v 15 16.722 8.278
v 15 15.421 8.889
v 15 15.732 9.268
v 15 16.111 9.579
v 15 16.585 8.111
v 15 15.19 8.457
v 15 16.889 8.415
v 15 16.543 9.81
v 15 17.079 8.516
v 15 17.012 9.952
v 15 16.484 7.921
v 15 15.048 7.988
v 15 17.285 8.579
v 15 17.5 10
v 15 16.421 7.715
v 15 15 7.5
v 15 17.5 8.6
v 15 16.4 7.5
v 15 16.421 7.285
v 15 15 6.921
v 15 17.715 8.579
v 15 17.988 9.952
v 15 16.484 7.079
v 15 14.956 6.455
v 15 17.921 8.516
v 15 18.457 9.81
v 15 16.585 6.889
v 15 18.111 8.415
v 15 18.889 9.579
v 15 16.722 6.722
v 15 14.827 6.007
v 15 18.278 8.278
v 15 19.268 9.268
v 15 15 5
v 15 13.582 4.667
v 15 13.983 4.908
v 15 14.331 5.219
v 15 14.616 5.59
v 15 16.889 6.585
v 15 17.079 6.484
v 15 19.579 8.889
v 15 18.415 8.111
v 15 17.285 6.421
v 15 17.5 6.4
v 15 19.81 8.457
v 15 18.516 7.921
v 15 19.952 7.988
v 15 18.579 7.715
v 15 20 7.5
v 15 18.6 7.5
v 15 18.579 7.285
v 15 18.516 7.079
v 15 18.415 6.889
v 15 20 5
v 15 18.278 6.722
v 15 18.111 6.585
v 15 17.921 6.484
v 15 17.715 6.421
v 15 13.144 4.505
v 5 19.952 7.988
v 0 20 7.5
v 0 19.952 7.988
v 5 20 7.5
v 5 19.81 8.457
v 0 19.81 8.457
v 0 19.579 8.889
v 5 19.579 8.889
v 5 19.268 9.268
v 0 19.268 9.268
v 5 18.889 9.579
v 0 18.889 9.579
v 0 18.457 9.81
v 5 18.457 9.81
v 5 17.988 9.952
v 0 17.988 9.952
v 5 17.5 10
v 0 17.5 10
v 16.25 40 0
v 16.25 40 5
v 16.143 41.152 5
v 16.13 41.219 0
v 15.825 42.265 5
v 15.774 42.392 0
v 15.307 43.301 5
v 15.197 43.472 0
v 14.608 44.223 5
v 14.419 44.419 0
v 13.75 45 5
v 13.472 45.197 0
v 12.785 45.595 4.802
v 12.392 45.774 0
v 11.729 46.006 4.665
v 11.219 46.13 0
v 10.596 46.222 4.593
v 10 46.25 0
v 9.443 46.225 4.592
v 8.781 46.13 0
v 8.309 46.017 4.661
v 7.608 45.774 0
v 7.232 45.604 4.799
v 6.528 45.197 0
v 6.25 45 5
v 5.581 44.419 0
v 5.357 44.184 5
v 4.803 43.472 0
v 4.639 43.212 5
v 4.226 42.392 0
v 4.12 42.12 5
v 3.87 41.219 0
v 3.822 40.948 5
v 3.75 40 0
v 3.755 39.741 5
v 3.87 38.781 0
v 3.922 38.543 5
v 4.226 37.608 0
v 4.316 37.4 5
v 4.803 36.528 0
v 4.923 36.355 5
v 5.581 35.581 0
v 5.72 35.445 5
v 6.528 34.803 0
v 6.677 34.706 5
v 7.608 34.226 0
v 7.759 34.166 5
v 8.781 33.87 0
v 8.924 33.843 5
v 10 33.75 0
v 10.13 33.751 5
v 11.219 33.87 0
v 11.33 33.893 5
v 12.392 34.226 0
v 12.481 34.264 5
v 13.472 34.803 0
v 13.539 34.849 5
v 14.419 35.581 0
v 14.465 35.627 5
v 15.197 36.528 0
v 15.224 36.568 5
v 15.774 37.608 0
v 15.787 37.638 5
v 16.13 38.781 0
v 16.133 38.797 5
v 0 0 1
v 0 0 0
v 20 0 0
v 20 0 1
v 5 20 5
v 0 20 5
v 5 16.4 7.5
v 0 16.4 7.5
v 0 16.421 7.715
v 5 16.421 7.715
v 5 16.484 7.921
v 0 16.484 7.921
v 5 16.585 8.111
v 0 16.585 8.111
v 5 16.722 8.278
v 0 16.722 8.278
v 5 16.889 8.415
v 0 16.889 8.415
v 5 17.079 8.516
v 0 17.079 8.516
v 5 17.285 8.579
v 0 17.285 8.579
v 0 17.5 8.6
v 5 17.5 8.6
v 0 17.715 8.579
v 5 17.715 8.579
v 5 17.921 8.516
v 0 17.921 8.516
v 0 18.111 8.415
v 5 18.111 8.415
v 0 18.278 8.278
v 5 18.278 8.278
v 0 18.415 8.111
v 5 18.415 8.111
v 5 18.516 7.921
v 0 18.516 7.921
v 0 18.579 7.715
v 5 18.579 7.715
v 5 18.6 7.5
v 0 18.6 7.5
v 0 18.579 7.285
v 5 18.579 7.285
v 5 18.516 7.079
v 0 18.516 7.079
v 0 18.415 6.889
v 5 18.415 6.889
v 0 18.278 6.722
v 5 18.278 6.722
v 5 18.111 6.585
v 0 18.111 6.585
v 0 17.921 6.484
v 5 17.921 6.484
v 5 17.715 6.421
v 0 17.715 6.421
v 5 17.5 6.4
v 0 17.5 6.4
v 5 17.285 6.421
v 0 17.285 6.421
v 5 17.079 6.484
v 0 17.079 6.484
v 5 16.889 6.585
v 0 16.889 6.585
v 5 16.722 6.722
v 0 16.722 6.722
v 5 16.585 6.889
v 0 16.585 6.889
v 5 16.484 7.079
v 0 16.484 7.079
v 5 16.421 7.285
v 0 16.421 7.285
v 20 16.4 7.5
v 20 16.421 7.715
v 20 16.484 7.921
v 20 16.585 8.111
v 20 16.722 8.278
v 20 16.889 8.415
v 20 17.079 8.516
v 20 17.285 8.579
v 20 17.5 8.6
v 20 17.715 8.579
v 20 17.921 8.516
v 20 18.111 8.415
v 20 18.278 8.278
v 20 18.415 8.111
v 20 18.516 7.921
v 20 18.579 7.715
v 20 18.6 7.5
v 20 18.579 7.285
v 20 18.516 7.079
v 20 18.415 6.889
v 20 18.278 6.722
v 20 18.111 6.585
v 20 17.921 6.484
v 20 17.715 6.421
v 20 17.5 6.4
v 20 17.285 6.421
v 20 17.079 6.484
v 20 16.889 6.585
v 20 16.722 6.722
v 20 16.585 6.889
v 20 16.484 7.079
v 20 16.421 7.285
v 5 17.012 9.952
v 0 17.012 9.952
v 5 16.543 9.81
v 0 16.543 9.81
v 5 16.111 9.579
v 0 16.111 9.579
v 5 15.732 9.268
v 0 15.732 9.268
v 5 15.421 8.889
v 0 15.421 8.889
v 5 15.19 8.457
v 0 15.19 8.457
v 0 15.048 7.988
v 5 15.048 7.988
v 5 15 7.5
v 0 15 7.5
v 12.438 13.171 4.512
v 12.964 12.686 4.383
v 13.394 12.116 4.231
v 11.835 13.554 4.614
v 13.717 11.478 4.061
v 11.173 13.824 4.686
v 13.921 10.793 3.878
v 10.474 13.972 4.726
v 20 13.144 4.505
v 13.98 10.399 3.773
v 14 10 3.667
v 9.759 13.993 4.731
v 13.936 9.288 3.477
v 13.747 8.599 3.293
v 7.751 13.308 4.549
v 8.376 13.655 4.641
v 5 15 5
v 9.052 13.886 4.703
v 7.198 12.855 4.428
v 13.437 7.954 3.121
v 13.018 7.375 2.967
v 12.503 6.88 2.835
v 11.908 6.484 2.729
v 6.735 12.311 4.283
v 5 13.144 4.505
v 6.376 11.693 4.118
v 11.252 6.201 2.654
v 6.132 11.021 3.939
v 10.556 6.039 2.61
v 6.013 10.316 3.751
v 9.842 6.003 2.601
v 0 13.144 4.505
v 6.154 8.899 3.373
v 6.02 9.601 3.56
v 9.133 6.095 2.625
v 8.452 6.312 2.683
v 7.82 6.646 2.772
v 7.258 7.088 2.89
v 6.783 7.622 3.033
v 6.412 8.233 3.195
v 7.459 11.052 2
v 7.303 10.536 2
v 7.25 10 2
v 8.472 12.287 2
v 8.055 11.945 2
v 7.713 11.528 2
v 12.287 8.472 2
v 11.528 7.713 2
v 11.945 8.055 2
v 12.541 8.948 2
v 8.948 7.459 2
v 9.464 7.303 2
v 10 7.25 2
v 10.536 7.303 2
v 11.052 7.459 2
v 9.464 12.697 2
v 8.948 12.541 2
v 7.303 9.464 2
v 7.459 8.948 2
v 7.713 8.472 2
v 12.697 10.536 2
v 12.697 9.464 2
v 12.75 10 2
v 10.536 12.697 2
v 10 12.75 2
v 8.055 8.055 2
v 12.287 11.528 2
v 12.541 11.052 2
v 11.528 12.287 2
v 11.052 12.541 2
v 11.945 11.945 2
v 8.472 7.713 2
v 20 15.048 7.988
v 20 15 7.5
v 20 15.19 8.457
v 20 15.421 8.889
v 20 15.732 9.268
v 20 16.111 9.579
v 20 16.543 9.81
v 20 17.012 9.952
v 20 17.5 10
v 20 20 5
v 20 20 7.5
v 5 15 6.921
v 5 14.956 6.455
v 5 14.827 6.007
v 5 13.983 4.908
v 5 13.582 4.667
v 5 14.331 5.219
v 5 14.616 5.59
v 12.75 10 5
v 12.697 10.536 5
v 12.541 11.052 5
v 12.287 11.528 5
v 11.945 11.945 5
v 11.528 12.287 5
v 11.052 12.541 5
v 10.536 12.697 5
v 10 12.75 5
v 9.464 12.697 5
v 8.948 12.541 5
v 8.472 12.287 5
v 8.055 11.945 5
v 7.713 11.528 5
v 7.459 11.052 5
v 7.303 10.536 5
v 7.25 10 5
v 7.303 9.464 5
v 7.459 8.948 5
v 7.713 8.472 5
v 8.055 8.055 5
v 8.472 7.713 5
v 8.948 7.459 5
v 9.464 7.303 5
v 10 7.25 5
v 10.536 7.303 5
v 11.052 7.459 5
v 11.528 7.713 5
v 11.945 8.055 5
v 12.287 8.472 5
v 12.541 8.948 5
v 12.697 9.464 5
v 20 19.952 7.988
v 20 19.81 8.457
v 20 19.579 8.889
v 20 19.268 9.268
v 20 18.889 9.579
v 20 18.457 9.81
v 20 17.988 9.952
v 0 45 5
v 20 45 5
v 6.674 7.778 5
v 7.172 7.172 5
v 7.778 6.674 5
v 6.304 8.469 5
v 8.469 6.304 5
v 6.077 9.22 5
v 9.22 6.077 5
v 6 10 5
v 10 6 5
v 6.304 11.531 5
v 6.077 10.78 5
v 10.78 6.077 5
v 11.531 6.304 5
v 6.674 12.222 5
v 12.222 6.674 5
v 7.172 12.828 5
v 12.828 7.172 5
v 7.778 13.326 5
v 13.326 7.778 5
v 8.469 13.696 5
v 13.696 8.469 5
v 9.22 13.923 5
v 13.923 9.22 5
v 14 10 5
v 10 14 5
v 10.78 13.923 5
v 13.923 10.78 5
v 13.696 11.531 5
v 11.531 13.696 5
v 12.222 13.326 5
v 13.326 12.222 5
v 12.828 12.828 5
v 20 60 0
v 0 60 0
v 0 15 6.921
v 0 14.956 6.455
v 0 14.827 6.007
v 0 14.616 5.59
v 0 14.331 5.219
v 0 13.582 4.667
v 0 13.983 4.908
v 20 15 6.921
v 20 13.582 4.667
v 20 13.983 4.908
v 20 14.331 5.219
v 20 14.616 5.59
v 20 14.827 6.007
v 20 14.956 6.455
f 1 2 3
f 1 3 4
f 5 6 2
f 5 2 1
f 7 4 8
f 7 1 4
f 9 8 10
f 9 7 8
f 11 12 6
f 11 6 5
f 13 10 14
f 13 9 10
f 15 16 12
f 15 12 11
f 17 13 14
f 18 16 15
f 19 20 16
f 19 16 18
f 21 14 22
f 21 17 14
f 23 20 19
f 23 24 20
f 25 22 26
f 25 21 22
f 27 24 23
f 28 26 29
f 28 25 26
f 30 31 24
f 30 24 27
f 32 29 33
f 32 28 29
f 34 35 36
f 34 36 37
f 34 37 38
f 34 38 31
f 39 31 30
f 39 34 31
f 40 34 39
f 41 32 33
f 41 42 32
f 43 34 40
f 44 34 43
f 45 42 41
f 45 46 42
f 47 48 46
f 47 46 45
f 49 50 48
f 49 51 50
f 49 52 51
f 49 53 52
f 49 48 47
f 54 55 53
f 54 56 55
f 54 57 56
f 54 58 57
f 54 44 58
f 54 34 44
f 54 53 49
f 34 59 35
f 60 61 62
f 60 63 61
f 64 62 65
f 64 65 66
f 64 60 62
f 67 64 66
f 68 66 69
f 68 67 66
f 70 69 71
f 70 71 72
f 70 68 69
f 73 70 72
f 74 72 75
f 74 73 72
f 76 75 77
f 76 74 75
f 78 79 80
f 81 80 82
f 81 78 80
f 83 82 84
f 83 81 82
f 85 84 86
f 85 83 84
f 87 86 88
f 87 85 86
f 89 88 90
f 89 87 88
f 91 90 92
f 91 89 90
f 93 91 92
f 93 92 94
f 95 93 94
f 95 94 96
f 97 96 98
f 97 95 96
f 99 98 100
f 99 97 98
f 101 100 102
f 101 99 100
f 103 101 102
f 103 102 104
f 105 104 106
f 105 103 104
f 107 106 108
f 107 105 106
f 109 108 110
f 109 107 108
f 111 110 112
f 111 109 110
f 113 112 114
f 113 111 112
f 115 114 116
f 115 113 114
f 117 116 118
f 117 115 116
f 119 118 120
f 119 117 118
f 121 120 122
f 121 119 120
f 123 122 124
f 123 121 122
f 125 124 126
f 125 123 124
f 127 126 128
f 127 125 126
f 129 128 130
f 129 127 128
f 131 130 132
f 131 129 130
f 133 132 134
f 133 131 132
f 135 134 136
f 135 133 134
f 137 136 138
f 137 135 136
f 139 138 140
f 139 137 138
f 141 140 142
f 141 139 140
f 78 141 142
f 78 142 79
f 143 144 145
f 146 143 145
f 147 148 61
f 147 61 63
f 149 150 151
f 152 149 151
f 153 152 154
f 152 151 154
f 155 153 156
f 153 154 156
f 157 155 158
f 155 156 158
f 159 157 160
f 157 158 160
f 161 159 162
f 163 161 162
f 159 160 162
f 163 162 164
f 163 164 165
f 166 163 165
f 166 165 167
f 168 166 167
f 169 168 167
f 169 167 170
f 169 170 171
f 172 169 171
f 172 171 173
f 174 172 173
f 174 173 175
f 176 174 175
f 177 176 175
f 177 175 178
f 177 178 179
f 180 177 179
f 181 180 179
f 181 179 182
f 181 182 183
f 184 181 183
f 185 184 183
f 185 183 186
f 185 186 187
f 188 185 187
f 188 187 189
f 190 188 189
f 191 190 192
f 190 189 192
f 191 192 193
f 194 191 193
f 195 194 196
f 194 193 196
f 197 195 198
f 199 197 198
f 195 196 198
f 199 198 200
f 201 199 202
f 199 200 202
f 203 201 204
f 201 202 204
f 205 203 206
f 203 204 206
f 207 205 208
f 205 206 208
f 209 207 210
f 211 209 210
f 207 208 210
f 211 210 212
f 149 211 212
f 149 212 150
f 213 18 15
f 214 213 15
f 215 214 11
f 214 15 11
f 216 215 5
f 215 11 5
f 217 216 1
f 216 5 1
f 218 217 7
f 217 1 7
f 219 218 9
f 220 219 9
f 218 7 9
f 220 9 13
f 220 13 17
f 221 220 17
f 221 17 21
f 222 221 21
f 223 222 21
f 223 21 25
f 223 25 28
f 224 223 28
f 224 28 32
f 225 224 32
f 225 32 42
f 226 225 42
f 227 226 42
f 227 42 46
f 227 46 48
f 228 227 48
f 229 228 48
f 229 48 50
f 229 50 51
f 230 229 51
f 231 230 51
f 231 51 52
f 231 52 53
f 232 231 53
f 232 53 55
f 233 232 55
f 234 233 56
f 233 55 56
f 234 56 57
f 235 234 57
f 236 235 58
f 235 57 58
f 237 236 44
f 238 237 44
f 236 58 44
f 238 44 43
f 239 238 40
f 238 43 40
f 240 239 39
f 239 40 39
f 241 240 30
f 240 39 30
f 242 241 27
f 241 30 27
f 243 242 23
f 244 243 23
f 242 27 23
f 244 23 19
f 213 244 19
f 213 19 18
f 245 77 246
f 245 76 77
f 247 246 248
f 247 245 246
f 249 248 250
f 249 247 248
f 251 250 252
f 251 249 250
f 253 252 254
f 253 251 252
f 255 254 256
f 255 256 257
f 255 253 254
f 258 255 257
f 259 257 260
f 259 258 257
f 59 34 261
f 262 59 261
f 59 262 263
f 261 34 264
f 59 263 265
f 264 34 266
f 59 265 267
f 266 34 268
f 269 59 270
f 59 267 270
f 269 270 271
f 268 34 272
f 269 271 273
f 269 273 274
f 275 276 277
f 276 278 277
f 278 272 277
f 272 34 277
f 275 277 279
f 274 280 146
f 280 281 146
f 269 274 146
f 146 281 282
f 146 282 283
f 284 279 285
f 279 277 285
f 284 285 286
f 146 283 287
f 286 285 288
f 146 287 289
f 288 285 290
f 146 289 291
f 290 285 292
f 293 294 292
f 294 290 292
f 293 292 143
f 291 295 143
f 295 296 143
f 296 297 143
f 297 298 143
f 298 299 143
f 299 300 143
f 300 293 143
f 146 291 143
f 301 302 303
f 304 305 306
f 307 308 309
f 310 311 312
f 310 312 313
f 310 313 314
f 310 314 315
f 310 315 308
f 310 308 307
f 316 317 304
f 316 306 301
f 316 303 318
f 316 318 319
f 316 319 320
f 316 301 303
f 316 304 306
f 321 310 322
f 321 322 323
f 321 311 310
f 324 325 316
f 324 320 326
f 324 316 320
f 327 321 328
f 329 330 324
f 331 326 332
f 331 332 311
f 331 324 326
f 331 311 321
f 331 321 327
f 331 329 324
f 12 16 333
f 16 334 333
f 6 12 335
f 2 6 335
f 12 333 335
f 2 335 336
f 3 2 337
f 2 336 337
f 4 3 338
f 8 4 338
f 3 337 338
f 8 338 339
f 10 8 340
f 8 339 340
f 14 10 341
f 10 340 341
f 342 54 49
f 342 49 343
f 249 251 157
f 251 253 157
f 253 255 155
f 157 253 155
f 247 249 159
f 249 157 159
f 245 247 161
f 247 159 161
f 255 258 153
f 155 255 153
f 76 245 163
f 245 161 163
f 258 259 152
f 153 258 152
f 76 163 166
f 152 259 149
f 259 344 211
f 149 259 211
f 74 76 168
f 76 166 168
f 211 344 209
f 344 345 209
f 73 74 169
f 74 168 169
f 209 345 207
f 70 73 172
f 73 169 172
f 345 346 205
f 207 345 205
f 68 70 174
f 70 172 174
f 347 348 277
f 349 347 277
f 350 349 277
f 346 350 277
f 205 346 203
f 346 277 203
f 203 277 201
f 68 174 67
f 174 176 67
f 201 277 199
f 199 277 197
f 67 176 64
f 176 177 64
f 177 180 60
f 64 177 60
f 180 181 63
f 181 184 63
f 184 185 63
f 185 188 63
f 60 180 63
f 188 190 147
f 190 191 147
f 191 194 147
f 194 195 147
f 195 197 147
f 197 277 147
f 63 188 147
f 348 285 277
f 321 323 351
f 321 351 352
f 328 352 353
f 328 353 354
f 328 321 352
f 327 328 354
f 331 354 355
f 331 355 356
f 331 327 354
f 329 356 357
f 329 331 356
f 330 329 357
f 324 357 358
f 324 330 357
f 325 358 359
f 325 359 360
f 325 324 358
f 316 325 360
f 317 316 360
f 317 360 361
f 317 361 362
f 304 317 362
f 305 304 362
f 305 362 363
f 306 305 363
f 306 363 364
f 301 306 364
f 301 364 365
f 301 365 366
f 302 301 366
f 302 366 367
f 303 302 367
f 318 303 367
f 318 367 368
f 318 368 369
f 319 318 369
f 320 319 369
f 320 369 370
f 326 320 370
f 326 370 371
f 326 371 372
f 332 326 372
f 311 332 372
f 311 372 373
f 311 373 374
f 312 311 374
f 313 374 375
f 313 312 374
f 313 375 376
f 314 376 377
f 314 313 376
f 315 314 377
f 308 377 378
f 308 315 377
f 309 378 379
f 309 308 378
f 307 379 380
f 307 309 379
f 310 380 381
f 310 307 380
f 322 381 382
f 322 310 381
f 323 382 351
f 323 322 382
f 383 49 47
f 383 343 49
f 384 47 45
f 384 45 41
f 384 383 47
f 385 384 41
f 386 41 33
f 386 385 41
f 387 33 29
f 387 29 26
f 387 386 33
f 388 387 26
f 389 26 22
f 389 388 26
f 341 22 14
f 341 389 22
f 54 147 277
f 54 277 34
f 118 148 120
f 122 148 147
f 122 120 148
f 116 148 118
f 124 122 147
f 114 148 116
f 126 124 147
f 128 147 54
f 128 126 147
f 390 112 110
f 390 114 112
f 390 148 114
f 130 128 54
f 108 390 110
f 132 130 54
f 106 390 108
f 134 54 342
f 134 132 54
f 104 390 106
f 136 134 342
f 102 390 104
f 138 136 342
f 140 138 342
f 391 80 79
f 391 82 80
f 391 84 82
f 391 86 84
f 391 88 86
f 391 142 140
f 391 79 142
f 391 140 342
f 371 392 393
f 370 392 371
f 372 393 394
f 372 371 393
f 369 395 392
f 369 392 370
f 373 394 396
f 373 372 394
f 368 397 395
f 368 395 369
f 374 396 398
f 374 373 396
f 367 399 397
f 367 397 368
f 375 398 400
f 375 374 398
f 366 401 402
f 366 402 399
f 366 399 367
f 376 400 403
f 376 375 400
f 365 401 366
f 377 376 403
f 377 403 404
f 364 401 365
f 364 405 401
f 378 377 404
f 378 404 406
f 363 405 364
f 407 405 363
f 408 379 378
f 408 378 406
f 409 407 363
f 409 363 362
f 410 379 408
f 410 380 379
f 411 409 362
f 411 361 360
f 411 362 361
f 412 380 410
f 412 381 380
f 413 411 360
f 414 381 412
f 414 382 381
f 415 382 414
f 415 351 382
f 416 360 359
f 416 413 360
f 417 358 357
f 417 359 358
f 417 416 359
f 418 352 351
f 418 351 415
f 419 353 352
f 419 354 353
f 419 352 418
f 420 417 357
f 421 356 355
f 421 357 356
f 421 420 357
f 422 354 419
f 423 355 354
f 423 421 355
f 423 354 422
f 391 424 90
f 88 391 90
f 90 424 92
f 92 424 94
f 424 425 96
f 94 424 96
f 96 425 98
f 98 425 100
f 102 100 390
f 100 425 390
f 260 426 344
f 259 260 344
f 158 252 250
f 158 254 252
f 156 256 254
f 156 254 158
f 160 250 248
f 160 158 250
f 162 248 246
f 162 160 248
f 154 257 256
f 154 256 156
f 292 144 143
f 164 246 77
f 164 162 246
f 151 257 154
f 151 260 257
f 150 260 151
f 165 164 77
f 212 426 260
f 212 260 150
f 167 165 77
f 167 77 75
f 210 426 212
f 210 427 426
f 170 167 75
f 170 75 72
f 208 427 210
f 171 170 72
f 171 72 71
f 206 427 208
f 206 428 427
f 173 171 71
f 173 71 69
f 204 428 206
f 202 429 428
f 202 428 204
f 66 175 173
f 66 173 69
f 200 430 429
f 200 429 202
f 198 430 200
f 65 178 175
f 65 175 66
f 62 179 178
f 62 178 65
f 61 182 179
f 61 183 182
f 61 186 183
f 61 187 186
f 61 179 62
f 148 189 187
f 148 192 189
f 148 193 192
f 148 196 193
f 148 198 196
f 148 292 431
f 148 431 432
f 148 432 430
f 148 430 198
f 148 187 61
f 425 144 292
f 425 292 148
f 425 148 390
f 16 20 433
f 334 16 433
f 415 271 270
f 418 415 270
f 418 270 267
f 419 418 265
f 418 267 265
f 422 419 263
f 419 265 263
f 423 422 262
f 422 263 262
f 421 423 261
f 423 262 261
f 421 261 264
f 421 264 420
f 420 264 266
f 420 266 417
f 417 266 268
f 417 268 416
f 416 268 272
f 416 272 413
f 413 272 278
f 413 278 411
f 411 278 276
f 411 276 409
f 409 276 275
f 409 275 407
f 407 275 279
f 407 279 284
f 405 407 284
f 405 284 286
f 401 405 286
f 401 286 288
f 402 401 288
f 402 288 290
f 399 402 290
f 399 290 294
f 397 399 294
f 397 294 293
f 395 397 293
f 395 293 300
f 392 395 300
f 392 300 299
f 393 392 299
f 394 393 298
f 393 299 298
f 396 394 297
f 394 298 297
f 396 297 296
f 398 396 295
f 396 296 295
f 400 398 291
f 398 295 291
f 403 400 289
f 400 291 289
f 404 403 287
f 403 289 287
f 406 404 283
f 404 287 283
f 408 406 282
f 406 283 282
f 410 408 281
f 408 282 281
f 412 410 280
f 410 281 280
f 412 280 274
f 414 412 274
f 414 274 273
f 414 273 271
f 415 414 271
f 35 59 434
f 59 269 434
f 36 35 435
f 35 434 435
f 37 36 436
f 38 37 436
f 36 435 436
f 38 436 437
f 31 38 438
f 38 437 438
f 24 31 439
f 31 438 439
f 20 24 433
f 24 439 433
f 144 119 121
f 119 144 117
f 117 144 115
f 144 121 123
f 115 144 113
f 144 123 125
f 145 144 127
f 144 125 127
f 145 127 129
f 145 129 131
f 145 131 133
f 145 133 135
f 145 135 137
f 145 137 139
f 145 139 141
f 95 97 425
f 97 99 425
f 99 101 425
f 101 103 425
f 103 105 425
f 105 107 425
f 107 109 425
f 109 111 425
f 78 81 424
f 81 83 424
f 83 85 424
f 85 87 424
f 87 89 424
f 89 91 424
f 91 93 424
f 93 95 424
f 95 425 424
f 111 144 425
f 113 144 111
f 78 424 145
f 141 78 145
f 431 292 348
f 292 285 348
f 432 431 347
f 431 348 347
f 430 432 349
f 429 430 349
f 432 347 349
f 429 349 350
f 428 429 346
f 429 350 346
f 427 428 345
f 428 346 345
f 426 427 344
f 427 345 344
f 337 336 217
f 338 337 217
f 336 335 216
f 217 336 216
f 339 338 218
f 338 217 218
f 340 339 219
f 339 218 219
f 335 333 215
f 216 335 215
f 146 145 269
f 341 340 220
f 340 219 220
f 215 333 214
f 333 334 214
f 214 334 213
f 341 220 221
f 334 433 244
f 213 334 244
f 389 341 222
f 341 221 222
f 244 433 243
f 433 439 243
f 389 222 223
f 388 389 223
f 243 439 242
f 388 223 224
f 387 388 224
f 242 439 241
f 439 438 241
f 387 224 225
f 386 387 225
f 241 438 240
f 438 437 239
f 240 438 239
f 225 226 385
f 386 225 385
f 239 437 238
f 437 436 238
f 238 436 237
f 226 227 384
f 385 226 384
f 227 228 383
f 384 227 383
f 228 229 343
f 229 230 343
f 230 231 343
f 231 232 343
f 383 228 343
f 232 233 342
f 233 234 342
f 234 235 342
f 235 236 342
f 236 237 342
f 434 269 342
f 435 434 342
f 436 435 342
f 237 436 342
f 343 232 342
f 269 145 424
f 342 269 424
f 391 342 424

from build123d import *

# Parameters (mm, degrees)
F0_W         = 20
F0_H         = 60
F0_R         = 4
F0_R_2       = 6.25
F1_DEPTH     = 4
F1_FACE_W    = 20
F1_FACE_H    = 60
F1_FACE_R    = 4
F1_FACE_R_2  = 6.25
F0_R_3       = 2.75
F2_DEPTH     = 1
F3_W         = 5
F3_H         = 5
F4_DEPTH     = 5
F5_T1_DEPTH  = 97.9025398997
F6_R         = 2.49999
F7_R         = 1.1
F8_DEPTH     = 25
F9_DEPTH     = 5
F10_T1_DEPTH = 97.8518303197
F11_DEPTH    = 2


# Not quite as in the source:
# - a fillet or chamfer that OpenCascade refuses, or shapes differently, is made with other operations: its cross-section is extruded or revolved along the edge and cut away or added
# - a fillet or chamfer is up to 0.001 mm smaller than in the source, because OpenCascade refuses the exact size


with BuildPart() as f1:
    # F0 (on Top) → F1 (new body)
    with BuildSketch(Plane.XY):
        with Locations((10, 30)):
            Rectangle(F0_W, F0_H)
        with Locations((10, 10)):
            Circle(F0_R, mode=Mode.SUBTRACT)
        with Locations((10, 40)):
            Circle(F0_R_2, mode=Mode.SUBTRACT)
    extrude(amount=F1_DEPTH)

    # F1_face (on face) + F0 (on Top) → F2 (join)
    with BuildSketch(Plane(origin=(10, 29.783961526, 4), x_dir=(1, 0, 0), z_dir=(0, 0, 1))):
        with Locations((0, 0.216038474)):
            Rectangle(F1_FACE_W, F1_FACE_H)
        with Locations((0, -19.783961526)):
            Circle(F1_FACE_R, mode=Mode.SUBTRACT)
        with Locations((0, 10.216038474)):
            Circle(F1_FACE_R_2, mode=Mode.SUBTRACT)
    with BuildSketch(Plane.XY):
        with Locations((10, 10)):
            Circle(F0_R)
        with Locations((10, 10)):
            Circle(F0_R_3, mode=Mode.SUBTRACT)
    extrude(amount=F2_DEPTH)

    # F3 (on face) → F4 (join)
    with BuildSketch(Plane.XY.offset(5)):
        with Locations((2.5, 17.5)):
            Rectangle(F3_W, F3_H)
        with Locations((17.5, 17.5)):
            Rectangle(F3_W, F3_H)
    extrude(amount=F4_DEPTH)

    # F5: chamfer of 15 x 4 on 1 edges, made by hand

    # F5_s2 → F5_t1 (cut)
    with BuildSketch(Plane.YZ.offset(-38.9512699498)):
        Polygon((15, 5), (0, 1), (0, 5), align=None)
    extrude(amount=F5_T1_DEPTH, mode=Mode.SUBTRACT)

    # F6 (radius 2.5 in the source; OpenCascade refuses exactly that, so slightly less here)
    f6_edges = [f1.edges().sort_by_distance(p)[0] for p in [
        (2.5, 15, 5),
        (2.5, 15, 10),
        (17.5, 15, 5),
        (17.5, 15, 10),
        (2.5, 20, 10),
        (17.5, 20, 10),
    ]]
    fillet(f6_edges, radius=F6_R)

    # F7 (on face) → F8 (cut)
    with BuildSketch(Plane(origin=(0, 0, 0), x_dir=(0, -1, 0), z_dir=(-1, 0, 0))):
        with Locations((-17.5, 7.5)):
            Circle(F7_R)
    extrude(amount=-F8_DEPTH, mode=Mode.SUBTRACT)

    # F10: chamfer of 5 x 15 on 1 edges, made by hand

    # F10_s2 → F10_t1 (cut)
    with BuildSketch(Plane.YZ.offset(-38.9259151598)):
        Polygon((60, 0), (45, 5), (60, 5), align=None)
    extrude(amount=F10_T1_DEPTH, mode=Mode.SUBTRACT)



with BuildPart() as f9:
    # F0 (on Top) → F9 (new body)
    with BuildSketch(Plane.XY):
        with Locations((10, 10)):
            Circle(F0_R)
        with Locations((10, 10)):
            Circle(F0_R_3, mode=Mode.SUBTRACT)
    extrude(amount=F9_DEPTH)


with BuildPart() as f1_1:
    add(f1.part)

    add(f9.part)  # F11 merges F9
    # F0 (on Top) → F11 (join)
    with BuildSketch(Plane.XY):
        with Locations((10, 10)):
            Circle(F0_R_3)
    extrude(amount=F11_DEPTH)


solid = f1_1.part
